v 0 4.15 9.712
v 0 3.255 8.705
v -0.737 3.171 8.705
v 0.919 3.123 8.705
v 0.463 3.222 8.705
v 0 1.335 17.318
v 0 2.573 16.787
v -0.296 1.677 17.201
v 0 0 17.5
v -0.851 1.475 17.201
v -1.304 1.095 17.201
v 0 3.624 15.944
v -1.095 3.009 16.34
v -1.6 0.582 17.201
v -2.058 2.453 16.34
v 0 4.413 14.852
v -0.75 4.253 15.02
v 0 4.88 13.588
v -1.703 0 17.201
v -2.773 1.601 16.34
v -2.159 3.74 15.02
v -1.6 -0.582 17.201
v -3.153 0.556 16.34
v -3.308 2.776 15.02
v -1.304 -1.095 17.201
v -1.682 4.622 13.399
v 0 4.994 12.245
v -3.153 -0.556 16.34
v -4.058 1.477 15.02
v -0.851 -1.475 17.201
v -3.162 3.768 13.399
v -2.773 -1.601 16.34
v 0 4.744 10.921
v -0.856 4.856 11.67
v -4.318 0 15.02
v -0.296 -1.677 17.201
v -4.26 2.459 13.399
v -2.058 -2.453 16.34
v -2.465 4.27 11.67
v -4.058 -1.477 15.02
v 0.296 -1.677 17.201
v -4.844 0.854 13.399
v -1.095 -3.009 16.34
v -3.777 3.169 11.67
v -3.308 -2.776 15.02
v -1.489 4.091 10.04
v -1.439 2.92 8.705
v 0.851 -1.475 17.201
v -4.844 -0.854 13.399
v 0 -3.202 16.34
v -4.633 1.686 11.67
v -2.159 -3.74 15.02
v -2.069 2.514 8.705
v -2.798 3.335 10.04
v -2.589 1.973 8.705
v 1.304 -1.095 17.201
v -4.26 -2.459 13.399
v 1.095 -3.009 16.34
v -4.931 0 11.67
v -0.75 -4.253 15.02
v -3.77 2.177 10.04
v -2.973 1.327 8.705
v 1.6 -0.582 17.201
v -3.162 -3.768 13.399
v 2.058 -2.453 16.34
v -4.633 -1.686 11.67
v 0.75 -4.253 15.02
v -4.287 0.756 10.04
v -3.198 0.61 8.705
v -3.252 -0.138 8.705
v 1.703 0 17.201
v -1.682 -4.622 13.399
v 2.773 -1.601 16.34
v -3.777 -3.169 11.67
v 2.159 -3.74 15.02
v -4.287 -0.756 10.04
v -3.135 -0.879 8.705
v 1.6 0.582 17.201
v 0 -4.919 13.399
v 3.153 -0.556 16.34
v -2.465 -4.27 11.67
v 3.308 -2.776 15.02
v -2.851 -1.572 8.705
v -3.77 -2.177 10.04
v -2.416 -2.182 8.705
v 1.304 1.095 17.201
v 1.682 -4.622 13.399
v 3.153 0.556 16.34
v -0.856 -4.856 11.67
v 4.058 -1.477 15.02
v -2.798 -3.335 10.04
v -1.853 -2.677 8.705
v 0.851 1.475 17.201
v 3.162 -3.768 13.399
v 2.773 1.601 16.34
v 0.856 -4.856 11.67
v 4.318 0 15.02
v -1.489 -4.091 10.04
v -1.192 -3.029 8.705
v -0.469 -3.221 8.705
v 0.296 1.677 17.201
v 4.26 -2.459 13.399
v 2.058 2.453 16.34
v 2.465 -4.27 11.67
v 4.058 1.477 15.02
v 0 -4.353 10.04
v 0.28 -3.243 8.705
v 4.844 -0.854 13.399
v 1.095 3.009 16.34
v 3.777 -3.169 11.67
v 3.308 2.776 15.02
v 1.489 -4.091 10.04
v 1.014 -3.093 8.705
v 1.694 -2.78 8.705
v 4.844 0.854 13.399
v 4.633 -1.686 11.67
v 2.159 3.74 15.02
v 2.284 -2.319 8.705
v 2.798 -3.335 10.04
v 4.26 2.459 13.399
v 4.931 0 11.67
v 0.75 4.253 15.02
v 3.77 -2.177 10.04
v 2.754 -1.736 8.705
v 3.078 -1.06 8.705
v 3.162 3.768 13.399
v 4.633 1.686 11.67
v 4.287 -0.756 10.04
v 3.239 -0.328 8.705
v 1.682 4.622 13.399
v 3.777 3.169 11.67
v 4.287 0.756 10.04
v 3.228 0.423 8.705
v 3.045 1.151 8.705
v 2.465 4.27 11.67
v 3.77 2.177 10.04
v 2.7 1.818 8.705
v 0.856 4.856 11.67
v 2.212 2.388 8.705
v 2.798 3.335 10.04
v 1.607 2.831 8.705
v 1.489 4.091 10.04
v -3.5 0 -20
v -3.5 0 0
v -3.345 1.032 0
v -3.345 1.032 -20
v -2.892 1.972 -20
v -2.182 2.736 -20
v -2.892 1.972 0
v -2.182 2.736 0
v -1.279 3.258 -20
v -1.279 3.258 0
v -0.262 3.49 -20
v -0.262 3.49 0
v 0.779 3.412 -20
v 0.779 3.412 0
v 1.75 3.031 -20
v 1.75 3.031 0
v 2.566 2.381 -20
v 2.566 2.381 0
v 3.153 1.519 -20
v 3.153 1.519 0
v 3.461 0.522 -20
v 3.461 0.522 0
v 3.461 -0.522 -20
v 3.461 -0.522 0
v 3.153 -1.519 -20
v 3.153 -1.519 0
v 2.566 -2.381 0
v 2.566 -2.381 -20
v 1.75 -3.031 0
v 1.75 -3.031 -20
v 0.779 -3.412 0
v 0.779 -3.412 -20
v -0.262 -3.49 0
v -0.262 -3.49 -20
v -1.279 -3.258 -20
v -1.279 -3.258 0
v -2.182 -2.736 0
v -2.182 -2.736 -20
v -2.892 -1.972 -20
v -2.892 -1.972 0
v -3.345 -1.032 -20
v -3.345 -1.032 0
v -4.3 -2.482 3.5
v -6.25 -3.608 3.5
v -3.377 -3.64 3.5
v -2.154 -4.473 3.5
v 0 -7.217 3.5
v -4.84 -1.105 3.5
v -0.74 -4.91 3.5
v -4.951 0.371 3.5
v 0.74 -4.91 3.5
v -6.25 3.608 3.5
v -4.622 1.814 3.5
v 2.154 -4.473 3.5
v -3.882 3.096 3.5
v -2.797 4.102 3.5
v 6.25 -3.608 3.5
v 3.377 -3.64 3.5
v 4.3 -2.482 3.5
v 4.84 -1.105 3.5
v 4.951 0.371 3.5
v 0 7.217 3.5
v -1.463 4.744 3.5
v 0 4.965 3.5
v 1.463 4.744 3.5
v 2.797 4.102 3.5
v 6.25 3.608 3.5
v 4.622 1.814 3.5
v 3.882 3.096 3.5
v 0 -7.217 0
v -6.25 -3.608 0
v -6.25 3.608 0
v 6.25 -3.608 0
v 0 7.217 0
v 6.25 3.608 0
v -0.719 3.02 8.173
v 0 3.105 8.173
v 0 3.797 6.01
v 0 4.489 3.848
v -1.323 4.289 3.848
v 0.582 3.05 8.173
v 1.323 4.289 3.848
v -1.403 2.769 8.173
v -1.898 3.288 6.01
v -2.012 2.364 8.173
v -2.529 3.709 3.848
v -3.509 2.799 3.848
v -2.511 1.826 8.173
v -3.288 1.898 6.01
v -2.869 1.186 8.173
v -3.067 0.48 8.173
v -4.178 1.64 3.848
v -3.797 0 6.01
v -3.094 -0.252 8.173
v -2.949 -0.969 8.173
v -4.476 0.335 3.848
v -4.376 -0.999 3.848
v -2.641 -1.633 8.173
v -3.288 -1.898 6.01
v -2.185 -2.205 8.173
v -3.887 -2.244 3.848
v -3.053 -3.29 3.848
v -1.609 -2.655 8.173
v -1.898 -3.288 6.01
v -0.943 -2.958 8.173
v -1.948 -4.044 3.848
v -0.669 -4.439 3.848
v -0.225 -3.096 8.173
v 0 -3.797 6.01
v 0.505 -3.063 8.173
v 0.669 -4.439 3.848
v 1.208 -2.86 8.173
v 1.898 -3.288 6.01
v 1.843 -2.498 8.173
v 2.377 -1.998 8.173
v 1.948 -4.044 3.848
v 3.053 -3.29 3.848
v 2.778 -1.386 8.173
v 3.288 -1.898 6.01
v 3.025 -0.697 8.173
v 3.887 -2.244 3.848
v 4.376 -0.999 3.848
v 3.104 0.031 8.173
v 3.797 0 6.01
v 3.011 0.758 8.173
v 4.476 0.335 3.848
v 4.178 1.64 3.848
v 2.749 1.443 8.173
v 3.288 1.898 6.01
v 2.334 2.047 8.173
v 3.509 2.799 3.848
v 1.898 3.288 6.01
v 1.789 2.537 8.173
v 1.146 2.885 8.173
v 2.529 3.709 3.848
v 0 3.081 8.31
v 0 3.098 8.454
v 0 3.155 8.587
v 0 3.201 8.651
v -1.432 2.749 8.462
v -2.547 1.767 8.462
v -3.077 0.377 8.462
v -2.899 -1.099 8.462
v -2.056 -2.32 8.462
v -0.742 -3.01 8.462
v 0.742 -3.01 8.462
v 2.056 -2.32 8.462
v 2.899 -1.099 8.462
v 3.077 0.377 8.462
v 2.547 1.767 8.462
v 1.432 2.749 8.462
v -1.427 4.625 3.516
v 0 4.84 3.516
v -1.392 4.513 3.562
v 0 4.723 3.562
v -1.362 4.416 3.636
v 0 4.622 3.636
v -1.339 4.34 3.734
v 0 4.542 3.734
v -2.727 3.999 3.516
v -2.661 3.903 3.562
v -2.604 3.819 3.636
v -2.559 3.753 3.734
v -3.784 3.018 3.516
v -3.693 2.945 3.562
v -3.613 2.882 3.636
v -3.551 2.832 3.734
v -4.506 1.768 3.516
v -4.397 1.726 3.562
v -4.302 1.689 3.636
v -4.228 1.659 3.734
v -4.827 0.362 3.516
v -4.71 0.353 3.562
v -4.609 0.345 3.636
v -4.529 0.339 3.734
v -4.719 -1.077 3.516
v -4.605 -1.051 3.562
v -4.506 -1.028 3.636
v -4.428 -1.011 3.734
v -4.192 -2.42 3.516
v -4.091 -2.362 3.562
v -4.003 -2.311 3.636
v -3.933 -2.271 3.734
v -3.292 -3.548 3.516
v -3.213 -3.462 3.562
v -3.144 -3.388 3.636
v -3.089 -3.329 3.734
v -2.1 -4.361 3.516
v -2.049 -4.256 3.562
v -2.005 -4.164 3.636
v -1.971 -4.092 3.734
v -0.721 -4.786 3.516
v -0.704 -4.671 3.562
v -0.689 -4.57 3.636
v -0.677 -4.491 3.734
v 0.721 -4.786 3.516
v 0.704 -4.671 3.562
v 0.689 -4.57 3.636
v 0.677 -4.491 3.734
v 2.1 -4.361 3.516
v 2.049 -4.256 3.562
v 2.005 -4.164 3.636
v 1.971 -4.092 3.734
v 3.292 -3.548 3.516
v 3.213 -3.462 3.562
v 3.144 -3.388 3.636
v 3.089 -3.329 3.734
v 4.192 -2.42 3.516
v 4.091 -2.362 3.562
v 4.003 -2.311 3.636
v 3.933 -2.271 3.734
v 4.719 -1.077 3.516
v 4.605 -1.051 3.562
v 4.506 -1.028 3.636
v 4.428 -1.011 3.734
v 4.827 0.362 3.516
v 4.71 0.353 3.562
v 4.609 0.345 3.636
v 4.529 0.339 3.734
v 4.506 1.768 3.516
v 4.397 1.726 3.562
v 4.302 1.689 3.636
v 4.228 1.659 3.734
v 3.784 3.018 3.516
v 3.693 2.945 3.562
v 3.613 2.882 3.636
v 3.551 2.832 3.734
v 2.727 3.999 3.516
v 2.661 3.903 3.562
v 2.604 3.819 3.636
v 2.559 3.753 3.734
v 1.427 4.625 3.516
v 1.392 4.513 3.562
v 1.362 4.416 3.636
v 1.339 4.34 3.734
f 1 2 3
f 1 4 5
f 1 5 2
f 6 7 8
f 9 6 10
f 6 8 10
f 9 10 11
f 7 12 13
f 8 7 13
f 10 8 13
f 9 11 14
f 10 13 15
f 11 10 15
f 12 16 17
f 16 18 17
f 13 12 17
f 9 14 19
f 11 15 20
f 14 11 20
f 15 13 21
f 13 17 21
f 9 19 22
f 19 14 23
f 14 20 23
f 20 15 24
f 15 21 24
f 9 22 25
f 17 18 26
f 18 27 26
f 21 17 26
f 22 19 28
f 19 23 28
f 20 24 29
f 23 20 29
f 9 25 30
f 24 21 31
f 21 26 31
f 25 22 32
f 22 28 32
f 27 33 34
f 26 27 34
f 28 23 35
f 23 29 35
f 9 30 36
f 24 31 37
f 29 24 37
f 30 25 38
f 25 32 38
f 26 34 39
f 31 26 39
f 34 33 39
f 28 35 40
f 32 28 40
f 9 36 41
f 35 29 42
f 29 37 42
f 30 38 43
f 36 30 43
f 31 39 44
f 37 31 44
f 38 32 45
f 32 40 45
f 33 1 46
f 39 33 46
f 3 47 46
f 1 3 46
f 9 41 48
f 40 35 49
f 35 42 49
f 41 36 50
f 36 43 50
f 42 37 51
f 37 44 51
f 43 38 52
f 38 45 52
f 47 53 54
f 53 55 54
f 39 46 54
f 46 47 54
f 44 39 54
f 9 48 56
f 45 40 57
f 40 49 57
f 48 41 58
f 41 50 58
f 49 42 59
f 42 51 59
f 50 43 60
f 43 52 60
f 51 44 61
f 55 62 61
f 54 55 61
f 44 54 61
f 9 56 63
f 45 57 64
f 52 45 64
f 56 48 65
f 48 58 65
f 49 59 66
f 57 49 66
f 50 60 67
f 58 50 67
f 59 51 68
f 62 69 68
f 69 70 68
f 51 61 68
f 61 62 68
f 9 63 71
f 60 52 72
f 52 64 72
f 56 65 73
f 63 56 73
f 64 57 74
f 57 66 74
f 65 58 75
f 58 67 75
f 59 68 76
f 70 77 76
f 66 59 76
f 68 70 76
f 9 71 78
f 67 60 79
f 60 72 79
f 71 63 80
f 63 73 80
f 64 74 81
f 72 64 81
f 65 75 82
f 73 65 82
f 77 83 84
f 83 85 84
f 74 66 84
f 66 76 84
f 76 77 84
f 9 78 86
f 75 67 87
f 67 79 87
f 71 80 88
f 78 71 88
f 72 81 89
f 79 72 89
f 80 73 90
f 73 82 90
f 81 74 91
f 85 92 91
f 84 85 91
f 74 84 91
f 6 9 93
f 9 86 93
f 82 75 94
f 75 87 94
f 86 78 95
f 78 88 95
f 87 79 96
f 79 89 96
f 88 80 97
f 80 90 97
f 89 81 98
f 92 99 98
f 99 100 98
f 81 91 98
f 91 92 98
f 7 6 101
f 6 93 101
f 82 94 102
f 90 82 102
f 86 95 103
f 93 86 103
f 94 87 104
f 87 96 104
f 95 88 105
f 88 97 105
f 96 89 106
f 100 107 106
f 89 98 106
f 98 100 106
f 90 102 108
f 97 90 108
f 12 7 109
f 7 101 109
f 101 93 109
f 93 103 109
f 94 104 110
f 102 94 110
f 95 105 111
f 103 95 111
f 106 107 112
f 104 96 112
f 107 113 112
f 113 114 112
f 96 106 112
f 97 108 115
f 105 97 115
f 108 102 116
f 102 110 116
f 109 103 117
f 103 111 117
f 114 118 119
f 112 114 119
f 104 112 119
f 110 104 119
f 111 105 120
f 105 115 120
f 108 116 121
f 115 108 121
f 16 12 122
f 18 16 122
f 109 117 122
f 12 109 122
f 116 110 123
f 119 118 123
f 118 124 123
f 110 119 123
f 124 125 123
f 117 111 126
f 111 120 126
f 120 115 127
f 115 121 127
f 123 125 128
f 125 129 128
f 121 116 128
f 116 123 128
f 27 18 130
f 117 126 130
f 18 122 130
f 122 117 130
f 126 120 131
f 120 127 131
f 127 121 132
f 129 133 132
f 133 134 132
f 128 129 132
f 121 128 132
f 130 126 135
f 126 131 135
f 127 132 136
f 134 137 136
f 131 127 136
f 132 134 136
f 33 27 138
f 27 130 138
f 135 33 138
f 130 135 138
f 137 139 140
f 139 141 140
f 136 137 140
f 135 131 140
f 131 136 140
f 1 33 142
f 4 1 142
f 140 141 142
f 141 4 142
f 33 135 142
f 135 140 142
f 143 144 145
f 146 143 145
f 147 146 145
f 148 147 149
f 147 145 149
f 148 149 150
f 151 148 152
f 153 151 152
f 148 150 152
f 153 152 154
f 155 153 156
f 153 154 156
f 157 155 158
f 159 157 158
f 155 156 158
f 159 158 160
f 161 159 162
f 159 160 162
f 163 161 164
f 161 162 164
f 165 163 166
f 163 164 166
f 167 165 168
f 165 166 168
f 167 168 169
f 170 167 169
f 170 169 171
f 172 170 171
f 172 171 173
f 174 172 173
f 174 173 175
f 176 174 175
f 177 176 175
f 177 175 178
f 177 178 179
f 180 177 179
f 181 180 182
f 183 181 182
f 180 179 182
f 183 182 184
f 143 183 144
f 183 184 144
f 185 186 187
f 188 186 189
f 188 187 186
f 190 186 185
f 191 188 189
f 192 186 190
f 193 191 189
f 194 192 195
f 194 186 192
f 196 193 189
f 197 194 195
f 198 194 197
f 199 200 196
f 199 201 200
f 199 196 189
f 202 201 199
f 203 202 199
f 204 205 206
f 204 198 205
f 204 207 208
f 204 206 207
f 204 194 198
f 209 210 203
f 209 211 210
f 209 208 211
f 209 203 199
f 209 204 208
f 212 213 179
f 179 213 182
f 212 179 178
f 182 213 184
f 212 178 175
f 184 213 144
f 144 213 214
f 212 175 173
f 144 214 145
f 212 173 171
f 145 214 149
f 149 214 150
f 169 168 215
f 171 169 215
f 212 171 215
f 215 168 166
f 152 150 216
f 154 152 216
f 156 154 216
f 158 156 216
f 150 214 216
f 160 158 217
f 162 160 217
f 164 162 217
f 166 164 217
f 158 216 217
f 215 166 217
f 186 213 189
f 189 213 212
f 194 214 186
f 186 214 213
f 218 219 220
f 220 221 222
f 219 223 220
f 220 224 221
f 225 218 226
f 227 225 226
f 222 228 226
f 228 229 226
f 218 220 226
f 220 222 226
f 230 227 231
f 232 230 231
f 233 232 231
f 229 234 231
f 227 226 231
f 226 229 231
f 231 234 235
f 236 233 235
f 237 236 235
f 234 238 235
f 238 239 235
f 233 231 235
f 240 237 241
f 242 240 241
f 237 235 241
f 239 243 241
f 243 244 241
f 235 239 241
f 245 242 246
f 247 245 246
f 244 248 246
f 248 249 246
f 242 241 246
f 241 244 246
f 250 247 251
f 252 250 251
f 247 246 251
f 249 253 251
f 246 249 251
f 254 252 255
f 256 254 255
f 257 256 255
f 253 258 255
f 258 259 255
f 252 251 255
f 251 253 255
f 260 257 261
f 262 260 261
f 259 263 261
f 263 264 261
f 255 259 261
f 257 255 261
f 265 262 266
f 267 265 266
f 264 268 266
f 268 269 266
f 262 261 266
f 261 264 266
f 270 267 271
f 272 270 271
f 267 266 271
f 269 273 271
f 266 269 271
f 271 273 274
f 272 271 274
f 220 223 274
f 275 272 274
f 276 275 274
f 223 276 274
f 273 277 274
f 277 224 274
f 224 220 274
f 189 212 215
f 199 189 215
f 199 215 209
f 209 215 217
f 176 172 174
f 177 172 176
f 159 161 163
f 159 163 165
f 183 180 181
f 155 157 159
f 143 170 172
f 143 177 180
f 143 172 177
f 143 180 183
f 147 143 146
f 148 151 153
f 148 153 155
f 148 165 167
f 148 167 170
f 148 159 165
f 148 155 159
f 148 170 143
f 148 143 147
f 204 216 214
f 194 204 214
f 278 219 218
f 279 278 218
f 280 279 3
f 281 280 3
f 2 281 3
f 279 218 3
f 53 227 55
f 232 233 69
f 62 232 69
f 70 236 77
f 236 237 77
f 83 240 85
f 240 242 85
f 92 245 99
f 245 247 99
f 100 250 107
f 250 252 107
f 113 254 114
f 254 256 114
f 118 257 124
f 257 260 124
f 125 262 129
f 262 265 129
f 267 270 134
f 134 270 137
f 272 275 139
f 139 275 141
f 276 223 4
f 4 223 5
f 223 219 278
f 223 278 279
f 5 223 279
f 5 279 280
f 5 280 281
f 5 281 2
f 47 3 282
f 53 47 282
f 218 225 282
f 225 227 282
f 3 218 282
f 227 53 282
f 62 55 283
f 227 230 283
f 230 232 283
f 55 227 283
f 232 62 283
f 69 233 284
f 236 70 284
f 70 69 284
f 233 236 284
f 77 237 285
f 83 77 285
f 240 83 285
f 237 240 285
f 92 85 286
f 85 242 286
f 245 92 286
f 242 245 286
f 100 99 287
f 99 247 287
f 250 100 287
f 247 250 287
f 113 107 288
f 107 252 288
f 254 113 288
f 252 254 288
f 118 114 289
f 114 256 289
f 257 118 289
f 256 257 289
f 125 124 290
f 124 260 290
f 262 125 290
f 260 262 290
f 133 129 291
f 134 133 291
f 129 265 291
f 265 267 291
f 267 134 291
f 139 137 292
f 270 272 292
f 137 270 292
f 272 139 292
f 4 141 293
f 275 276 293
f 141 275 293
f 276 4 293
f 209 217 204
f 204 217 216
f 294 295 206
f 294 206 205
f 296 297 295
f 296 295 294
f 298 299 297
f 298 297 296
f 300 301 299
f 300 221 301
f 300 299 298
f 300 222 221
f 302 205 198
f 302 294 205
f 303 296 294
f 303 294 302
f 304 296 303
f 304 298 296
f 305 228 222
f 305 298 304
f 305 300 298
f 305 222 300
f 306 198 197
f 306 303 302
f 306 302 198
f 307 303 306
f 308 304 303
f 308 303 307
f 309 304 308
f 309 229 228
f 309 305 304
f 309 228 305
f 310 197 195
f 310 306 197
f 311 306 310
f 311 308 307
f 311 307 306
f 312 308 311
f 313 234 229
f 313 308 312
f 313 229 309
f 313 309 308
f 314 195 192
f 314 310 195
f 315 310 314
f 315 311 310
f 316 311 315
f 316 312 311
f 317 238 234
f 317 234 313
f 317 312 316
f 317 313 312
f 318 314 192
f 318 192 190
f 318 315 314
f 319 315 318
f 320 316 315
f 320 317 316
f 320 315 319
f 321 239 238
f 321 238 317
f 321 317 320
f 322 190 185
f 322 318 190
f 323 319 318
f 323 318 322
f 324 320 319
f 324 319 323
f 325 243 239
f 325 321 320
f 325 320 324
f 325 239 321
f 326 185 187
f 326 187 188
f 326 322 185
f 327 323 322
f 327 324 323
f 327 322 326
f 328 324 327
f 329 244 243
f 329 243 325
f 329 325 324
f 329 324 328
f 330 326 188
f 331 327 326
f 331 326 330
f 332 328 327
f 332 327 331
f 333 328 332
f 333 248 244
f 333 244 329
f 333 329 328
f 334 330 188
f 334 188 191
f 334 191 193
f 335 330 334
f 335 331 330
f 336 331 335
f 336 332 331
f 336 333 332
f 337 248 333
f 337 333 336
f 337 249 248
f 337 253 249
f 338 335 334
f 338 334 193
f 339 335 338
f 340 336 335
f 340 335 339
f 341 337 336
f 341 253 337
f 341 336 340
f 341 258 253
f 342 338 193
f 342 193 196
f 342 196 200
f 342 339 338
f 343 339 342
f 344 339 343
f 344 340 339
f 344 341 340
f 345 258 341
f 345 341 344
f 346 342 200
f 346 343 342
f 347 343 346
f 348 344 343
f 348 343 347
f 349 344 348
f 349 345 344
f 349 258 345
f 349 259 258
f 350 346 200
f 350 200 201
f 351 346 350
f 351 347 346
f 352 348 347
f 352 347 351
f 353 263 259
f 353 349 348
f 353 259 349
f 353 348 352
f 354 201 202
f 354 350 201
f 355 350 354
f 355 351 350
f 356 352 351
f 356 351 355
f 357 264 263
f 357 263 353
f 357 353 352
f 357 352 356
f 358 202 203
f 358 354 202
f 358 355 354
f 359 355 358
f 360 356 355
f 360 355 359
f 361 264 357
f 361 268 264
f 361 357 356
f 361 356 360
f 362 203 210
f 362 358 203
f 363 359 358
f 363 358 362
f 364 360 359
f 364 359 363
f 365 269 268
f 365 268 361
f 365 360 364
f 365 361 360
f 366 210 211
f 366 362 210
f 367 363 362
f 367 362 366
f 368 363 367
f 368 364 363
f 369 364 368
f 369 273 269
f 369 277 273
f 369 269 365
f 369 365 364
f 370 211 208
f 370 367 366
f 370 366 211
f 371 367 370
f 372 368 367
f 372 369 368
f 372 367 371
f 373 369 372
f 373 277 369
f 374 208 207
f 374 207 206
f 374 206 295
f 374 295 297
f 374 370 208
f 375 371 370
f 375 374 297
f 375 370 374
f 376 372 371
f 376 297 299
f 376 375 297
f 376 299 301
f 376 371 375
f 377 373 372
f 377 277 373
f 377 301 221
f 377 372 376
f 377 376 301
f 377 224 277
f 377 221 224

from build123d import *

# Parameters (mm, degrees)
BOSS_EXTRUDE2_DEPTH = 3.5
SKETCH3_R           = 3.5
BOSS_EXTRUDE3_DEPTH = 20
FILLET1_R           = 0.5


with BuildPart() as part:
    # Sketch2 → Boss-Extrude2 (new body)
    with BuildSketch(Plane.XY):
        Polygon((0, 7.216878365), (-6.25, 3.608439182), (-6.25, -3.608439182), (0, -7.216878365), (6.25, -3.608439182), (6.25, 3.608439182), align=None)
    extrude(amount=BOSS_EXTRUDE2_DEPTH)

    # Sketch3 → Boss-Extrude3 (add)
    with BuildSketch(Plane(origin=(0, 0, 0), x_dir=(-1, 0, 0), z_dir=(0, 0, -1))):
        Circle(SKETCH3_R)
    extrude(amount=BOSS_EXTRUDE3_DEPTH)

    # Sketch4 → Revolve1 (revolve)
    with BuildSketch(Plane(origin=(0, 0, 0), x_dir=(0, 0, -1), z_dir=(1, 0, 0))):
        with BuildLine():
            Line((-3.5, 0), (-17.5, 0))
            ThreePointArc((-17.5, 0), (-14.08113883, 4.74341649), (-8.5, 3))
            Line((-8.5, 3), (-3.5, 4.6))
            Line((-3.5, 4.6), (-3.5, 0))
        make_face()
    revolve(axis=Axis((0, 0, 3.5), (0, 0, 1)))

    # Fillet1
    fillet1_edges = [part.edges().sort_by_distance(p)[0] for p in [
        (0, -4.6, 3.5),
        (0, -3, 8.5),
    ]]
    fillet(fillet1_edges, radius=FILLET1_R)


solid = part.part
